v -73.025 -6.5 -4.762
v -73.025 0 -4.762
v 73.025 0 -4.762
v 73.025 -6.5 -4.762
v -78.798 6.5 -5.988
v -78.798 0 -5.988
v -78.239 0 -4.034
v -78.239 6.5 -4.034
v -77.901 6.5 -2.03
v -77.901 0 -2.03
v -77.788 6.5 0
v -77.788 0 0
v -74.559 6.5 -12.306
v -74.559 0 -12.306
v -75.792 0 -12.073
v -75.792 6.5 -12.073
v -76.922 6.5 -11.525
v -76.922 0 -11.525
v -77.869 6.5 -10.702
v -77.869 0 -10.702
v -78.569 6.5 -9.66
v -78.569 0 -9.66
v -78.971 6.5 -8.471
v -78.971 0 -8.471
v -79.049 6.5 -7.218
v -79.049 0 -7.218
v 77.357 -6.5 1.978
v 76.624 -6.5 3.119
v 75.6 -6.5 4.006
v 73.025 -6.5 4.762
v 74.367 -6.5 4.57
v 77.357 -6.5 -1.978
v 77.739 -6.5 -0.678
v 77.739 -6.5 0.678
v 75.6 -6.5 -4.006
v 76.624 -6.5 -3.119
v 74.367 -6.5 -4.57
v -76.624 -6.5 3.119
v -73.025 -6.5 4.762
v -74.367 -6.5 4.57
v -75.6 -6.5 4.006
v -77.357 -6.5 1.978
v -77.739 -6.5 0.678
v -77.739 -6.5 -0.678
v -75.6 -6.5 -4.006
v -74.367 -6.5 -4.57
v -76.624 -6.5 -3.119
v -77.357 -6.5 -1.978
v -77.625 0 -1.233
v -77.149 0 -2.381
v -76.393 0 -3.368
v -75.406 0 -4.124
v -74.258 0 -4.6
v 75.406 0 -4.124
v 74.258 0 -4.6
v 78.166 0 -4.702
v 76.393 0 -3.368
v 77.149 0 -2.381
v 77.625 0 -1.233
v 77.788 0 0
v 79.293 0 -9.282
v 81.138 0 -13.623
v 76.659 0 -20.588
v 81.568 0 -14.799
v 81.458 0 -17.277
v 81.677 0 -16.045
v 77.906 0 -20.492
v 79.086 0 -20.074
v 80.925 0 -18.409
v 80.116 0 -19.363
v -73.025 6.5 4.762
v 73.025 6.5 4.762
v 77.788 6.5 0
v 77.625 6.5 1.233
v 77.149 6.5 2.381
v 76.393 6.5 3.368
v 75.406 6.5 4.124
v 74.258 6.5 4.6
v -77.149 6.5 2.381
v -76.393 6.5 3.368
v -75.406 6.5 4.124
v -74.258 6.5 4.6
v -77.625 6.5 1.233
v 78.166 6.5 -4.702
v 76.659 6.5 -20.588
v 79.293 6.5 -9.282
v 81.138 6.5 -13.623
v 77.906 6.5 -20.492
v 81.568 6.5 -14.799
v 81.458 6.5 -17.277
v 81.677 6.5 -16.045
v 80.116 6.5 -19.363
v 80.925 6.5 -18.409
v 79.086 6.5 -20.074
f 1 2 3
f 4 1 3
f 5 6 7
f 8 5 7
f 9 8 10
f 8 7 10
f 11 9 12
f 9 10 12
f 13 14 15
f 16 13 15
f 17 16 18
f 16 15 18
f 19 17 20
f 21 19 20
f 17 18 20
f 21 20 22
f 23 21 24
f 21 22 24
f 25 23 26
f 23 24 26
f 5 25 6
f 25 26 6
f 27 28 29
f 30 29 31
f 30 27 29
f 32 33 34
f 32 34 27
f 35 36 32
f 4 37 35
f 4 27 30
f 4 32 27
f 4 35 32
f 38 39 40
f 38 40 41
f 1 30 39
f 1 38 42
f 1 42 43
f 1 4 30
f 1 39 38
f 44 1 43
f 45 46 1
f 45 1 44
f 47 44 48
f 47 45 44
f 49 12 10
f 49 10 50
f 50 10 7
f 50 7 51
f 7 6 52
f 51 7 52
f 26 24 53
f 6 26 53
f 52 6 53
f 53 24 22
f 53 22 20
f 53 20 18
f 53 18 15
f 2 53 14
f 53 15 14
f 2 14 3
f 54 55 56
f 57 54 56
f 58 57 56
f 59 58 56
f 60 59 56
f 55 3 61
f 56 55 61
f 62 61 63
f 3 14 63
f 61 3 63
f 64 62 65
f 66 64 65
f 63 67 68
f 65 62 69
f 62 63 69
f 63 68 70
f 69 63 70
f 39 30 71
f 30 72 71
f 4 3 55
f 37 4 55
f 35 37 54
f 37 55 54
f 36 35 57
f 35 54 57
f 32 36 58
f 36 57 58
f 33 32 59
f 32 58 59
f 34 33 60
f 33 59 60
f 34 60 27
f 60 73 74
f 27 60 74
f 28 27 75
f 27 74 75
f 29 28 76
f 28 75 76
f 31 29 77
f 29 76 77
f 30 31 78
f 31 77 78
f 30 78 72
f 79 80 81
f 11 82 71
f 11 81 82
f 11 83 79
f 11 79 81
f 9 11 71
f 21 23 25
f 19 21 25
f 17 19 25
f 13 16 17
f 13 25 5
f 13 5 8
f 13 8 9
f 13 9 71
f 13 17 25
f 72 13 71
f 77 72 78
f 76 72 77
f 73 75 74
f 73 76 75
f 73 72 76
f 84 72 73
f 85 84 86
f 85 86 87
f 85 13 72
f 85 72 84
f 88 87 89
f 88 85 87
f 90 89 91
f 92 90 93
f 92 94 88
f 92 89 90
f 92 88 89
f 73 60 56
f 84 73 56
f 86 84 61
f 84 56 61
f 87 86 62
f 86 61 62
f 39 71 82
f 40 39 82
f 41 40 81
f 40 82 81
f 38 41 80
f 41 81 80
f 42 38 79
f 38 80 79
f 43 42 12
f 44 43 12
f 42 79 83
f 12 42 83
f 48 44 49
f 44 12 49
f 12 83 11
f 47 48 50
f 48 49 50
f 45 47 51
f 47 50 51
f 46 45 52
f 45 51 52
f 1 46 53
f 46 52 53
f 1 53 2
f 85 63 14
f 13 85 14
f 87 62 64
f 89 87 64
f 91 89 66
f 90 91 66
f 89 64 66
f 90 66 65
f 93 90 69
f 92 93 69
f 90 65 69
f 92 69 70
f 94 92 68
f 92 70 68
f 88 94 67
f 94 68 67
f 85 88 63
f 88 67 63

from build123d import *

# Parameters (mm, degrees)
BOSS_EXTRUDE1_DEPTH = 6.499999954
BOSS_EXTRUDE2_DEPTH = 6.5


with BuildPart() as part:
    # Sketch1 → Boss-Extrude1 (new body, symmetric)
    with BuildSketch(Plane(origin=(0, 0, 0), x_dir=(1, 0, 0), z_dir=(0, 1, 0))):
        with BuildLine():
            Line((-73.025, 4.7625), (73.025, 4.7625))
            ThreePointArc((73.025, 4.7625), (77.7875, 0), (73.025, -4.7625))
            Line((73.025, -4.7625), (-73.025, -4.7625))
            ThreePointArc((-73.025, -4.7625), (-77.7875, 0), (-73.025, 4.7625))
        make_face()
    extrude(amount=BOSS_EXTRUDE1_DEPTH, both=True)

    # Sketch3 → Boss-Extrude2 (add)
    with BuildSketch(Plane(origin=(0, 0, 0), x_dir=(1, 0, 0), z_dir=(0, 1, 0))):
        with BuildLine():
            Line((76.658892628, 20.587985299), (-74.559016538, 12.30586185))
            ThreePointArc((-74.559016538, 12.30586185), (-78.253429498, 10.203877505), (-78.797570633, 5.988318736))
            ThreePointArc((-78.797570633, 5.988318736), (-78.041788633, 3.036453687), (-77.7875, 0))
            ThreePointArc((-77.7875, 0), (-76.392596045, 3.367596045), (-73.025, 4.7625))
            Line((-73.025, 4.7625), (73.025, 4.7625))
            ThreePointArc((73.025, 4.7625), (76.392596045, 3.367596045), (77.7875, 0))
            ThreePointArc((77.7875, 0), (78.637537914, 7.014737168), (81.13844531, 13.623410575))
            ThreePointArc((81.13844531, 13.623410575), (80.924845702, 18.408916837), (76.658892628, 20.587985299))
        make_face()
    extrude(amount=BOSS_EXTRUDE2_DEPTH)


solid = part.part
